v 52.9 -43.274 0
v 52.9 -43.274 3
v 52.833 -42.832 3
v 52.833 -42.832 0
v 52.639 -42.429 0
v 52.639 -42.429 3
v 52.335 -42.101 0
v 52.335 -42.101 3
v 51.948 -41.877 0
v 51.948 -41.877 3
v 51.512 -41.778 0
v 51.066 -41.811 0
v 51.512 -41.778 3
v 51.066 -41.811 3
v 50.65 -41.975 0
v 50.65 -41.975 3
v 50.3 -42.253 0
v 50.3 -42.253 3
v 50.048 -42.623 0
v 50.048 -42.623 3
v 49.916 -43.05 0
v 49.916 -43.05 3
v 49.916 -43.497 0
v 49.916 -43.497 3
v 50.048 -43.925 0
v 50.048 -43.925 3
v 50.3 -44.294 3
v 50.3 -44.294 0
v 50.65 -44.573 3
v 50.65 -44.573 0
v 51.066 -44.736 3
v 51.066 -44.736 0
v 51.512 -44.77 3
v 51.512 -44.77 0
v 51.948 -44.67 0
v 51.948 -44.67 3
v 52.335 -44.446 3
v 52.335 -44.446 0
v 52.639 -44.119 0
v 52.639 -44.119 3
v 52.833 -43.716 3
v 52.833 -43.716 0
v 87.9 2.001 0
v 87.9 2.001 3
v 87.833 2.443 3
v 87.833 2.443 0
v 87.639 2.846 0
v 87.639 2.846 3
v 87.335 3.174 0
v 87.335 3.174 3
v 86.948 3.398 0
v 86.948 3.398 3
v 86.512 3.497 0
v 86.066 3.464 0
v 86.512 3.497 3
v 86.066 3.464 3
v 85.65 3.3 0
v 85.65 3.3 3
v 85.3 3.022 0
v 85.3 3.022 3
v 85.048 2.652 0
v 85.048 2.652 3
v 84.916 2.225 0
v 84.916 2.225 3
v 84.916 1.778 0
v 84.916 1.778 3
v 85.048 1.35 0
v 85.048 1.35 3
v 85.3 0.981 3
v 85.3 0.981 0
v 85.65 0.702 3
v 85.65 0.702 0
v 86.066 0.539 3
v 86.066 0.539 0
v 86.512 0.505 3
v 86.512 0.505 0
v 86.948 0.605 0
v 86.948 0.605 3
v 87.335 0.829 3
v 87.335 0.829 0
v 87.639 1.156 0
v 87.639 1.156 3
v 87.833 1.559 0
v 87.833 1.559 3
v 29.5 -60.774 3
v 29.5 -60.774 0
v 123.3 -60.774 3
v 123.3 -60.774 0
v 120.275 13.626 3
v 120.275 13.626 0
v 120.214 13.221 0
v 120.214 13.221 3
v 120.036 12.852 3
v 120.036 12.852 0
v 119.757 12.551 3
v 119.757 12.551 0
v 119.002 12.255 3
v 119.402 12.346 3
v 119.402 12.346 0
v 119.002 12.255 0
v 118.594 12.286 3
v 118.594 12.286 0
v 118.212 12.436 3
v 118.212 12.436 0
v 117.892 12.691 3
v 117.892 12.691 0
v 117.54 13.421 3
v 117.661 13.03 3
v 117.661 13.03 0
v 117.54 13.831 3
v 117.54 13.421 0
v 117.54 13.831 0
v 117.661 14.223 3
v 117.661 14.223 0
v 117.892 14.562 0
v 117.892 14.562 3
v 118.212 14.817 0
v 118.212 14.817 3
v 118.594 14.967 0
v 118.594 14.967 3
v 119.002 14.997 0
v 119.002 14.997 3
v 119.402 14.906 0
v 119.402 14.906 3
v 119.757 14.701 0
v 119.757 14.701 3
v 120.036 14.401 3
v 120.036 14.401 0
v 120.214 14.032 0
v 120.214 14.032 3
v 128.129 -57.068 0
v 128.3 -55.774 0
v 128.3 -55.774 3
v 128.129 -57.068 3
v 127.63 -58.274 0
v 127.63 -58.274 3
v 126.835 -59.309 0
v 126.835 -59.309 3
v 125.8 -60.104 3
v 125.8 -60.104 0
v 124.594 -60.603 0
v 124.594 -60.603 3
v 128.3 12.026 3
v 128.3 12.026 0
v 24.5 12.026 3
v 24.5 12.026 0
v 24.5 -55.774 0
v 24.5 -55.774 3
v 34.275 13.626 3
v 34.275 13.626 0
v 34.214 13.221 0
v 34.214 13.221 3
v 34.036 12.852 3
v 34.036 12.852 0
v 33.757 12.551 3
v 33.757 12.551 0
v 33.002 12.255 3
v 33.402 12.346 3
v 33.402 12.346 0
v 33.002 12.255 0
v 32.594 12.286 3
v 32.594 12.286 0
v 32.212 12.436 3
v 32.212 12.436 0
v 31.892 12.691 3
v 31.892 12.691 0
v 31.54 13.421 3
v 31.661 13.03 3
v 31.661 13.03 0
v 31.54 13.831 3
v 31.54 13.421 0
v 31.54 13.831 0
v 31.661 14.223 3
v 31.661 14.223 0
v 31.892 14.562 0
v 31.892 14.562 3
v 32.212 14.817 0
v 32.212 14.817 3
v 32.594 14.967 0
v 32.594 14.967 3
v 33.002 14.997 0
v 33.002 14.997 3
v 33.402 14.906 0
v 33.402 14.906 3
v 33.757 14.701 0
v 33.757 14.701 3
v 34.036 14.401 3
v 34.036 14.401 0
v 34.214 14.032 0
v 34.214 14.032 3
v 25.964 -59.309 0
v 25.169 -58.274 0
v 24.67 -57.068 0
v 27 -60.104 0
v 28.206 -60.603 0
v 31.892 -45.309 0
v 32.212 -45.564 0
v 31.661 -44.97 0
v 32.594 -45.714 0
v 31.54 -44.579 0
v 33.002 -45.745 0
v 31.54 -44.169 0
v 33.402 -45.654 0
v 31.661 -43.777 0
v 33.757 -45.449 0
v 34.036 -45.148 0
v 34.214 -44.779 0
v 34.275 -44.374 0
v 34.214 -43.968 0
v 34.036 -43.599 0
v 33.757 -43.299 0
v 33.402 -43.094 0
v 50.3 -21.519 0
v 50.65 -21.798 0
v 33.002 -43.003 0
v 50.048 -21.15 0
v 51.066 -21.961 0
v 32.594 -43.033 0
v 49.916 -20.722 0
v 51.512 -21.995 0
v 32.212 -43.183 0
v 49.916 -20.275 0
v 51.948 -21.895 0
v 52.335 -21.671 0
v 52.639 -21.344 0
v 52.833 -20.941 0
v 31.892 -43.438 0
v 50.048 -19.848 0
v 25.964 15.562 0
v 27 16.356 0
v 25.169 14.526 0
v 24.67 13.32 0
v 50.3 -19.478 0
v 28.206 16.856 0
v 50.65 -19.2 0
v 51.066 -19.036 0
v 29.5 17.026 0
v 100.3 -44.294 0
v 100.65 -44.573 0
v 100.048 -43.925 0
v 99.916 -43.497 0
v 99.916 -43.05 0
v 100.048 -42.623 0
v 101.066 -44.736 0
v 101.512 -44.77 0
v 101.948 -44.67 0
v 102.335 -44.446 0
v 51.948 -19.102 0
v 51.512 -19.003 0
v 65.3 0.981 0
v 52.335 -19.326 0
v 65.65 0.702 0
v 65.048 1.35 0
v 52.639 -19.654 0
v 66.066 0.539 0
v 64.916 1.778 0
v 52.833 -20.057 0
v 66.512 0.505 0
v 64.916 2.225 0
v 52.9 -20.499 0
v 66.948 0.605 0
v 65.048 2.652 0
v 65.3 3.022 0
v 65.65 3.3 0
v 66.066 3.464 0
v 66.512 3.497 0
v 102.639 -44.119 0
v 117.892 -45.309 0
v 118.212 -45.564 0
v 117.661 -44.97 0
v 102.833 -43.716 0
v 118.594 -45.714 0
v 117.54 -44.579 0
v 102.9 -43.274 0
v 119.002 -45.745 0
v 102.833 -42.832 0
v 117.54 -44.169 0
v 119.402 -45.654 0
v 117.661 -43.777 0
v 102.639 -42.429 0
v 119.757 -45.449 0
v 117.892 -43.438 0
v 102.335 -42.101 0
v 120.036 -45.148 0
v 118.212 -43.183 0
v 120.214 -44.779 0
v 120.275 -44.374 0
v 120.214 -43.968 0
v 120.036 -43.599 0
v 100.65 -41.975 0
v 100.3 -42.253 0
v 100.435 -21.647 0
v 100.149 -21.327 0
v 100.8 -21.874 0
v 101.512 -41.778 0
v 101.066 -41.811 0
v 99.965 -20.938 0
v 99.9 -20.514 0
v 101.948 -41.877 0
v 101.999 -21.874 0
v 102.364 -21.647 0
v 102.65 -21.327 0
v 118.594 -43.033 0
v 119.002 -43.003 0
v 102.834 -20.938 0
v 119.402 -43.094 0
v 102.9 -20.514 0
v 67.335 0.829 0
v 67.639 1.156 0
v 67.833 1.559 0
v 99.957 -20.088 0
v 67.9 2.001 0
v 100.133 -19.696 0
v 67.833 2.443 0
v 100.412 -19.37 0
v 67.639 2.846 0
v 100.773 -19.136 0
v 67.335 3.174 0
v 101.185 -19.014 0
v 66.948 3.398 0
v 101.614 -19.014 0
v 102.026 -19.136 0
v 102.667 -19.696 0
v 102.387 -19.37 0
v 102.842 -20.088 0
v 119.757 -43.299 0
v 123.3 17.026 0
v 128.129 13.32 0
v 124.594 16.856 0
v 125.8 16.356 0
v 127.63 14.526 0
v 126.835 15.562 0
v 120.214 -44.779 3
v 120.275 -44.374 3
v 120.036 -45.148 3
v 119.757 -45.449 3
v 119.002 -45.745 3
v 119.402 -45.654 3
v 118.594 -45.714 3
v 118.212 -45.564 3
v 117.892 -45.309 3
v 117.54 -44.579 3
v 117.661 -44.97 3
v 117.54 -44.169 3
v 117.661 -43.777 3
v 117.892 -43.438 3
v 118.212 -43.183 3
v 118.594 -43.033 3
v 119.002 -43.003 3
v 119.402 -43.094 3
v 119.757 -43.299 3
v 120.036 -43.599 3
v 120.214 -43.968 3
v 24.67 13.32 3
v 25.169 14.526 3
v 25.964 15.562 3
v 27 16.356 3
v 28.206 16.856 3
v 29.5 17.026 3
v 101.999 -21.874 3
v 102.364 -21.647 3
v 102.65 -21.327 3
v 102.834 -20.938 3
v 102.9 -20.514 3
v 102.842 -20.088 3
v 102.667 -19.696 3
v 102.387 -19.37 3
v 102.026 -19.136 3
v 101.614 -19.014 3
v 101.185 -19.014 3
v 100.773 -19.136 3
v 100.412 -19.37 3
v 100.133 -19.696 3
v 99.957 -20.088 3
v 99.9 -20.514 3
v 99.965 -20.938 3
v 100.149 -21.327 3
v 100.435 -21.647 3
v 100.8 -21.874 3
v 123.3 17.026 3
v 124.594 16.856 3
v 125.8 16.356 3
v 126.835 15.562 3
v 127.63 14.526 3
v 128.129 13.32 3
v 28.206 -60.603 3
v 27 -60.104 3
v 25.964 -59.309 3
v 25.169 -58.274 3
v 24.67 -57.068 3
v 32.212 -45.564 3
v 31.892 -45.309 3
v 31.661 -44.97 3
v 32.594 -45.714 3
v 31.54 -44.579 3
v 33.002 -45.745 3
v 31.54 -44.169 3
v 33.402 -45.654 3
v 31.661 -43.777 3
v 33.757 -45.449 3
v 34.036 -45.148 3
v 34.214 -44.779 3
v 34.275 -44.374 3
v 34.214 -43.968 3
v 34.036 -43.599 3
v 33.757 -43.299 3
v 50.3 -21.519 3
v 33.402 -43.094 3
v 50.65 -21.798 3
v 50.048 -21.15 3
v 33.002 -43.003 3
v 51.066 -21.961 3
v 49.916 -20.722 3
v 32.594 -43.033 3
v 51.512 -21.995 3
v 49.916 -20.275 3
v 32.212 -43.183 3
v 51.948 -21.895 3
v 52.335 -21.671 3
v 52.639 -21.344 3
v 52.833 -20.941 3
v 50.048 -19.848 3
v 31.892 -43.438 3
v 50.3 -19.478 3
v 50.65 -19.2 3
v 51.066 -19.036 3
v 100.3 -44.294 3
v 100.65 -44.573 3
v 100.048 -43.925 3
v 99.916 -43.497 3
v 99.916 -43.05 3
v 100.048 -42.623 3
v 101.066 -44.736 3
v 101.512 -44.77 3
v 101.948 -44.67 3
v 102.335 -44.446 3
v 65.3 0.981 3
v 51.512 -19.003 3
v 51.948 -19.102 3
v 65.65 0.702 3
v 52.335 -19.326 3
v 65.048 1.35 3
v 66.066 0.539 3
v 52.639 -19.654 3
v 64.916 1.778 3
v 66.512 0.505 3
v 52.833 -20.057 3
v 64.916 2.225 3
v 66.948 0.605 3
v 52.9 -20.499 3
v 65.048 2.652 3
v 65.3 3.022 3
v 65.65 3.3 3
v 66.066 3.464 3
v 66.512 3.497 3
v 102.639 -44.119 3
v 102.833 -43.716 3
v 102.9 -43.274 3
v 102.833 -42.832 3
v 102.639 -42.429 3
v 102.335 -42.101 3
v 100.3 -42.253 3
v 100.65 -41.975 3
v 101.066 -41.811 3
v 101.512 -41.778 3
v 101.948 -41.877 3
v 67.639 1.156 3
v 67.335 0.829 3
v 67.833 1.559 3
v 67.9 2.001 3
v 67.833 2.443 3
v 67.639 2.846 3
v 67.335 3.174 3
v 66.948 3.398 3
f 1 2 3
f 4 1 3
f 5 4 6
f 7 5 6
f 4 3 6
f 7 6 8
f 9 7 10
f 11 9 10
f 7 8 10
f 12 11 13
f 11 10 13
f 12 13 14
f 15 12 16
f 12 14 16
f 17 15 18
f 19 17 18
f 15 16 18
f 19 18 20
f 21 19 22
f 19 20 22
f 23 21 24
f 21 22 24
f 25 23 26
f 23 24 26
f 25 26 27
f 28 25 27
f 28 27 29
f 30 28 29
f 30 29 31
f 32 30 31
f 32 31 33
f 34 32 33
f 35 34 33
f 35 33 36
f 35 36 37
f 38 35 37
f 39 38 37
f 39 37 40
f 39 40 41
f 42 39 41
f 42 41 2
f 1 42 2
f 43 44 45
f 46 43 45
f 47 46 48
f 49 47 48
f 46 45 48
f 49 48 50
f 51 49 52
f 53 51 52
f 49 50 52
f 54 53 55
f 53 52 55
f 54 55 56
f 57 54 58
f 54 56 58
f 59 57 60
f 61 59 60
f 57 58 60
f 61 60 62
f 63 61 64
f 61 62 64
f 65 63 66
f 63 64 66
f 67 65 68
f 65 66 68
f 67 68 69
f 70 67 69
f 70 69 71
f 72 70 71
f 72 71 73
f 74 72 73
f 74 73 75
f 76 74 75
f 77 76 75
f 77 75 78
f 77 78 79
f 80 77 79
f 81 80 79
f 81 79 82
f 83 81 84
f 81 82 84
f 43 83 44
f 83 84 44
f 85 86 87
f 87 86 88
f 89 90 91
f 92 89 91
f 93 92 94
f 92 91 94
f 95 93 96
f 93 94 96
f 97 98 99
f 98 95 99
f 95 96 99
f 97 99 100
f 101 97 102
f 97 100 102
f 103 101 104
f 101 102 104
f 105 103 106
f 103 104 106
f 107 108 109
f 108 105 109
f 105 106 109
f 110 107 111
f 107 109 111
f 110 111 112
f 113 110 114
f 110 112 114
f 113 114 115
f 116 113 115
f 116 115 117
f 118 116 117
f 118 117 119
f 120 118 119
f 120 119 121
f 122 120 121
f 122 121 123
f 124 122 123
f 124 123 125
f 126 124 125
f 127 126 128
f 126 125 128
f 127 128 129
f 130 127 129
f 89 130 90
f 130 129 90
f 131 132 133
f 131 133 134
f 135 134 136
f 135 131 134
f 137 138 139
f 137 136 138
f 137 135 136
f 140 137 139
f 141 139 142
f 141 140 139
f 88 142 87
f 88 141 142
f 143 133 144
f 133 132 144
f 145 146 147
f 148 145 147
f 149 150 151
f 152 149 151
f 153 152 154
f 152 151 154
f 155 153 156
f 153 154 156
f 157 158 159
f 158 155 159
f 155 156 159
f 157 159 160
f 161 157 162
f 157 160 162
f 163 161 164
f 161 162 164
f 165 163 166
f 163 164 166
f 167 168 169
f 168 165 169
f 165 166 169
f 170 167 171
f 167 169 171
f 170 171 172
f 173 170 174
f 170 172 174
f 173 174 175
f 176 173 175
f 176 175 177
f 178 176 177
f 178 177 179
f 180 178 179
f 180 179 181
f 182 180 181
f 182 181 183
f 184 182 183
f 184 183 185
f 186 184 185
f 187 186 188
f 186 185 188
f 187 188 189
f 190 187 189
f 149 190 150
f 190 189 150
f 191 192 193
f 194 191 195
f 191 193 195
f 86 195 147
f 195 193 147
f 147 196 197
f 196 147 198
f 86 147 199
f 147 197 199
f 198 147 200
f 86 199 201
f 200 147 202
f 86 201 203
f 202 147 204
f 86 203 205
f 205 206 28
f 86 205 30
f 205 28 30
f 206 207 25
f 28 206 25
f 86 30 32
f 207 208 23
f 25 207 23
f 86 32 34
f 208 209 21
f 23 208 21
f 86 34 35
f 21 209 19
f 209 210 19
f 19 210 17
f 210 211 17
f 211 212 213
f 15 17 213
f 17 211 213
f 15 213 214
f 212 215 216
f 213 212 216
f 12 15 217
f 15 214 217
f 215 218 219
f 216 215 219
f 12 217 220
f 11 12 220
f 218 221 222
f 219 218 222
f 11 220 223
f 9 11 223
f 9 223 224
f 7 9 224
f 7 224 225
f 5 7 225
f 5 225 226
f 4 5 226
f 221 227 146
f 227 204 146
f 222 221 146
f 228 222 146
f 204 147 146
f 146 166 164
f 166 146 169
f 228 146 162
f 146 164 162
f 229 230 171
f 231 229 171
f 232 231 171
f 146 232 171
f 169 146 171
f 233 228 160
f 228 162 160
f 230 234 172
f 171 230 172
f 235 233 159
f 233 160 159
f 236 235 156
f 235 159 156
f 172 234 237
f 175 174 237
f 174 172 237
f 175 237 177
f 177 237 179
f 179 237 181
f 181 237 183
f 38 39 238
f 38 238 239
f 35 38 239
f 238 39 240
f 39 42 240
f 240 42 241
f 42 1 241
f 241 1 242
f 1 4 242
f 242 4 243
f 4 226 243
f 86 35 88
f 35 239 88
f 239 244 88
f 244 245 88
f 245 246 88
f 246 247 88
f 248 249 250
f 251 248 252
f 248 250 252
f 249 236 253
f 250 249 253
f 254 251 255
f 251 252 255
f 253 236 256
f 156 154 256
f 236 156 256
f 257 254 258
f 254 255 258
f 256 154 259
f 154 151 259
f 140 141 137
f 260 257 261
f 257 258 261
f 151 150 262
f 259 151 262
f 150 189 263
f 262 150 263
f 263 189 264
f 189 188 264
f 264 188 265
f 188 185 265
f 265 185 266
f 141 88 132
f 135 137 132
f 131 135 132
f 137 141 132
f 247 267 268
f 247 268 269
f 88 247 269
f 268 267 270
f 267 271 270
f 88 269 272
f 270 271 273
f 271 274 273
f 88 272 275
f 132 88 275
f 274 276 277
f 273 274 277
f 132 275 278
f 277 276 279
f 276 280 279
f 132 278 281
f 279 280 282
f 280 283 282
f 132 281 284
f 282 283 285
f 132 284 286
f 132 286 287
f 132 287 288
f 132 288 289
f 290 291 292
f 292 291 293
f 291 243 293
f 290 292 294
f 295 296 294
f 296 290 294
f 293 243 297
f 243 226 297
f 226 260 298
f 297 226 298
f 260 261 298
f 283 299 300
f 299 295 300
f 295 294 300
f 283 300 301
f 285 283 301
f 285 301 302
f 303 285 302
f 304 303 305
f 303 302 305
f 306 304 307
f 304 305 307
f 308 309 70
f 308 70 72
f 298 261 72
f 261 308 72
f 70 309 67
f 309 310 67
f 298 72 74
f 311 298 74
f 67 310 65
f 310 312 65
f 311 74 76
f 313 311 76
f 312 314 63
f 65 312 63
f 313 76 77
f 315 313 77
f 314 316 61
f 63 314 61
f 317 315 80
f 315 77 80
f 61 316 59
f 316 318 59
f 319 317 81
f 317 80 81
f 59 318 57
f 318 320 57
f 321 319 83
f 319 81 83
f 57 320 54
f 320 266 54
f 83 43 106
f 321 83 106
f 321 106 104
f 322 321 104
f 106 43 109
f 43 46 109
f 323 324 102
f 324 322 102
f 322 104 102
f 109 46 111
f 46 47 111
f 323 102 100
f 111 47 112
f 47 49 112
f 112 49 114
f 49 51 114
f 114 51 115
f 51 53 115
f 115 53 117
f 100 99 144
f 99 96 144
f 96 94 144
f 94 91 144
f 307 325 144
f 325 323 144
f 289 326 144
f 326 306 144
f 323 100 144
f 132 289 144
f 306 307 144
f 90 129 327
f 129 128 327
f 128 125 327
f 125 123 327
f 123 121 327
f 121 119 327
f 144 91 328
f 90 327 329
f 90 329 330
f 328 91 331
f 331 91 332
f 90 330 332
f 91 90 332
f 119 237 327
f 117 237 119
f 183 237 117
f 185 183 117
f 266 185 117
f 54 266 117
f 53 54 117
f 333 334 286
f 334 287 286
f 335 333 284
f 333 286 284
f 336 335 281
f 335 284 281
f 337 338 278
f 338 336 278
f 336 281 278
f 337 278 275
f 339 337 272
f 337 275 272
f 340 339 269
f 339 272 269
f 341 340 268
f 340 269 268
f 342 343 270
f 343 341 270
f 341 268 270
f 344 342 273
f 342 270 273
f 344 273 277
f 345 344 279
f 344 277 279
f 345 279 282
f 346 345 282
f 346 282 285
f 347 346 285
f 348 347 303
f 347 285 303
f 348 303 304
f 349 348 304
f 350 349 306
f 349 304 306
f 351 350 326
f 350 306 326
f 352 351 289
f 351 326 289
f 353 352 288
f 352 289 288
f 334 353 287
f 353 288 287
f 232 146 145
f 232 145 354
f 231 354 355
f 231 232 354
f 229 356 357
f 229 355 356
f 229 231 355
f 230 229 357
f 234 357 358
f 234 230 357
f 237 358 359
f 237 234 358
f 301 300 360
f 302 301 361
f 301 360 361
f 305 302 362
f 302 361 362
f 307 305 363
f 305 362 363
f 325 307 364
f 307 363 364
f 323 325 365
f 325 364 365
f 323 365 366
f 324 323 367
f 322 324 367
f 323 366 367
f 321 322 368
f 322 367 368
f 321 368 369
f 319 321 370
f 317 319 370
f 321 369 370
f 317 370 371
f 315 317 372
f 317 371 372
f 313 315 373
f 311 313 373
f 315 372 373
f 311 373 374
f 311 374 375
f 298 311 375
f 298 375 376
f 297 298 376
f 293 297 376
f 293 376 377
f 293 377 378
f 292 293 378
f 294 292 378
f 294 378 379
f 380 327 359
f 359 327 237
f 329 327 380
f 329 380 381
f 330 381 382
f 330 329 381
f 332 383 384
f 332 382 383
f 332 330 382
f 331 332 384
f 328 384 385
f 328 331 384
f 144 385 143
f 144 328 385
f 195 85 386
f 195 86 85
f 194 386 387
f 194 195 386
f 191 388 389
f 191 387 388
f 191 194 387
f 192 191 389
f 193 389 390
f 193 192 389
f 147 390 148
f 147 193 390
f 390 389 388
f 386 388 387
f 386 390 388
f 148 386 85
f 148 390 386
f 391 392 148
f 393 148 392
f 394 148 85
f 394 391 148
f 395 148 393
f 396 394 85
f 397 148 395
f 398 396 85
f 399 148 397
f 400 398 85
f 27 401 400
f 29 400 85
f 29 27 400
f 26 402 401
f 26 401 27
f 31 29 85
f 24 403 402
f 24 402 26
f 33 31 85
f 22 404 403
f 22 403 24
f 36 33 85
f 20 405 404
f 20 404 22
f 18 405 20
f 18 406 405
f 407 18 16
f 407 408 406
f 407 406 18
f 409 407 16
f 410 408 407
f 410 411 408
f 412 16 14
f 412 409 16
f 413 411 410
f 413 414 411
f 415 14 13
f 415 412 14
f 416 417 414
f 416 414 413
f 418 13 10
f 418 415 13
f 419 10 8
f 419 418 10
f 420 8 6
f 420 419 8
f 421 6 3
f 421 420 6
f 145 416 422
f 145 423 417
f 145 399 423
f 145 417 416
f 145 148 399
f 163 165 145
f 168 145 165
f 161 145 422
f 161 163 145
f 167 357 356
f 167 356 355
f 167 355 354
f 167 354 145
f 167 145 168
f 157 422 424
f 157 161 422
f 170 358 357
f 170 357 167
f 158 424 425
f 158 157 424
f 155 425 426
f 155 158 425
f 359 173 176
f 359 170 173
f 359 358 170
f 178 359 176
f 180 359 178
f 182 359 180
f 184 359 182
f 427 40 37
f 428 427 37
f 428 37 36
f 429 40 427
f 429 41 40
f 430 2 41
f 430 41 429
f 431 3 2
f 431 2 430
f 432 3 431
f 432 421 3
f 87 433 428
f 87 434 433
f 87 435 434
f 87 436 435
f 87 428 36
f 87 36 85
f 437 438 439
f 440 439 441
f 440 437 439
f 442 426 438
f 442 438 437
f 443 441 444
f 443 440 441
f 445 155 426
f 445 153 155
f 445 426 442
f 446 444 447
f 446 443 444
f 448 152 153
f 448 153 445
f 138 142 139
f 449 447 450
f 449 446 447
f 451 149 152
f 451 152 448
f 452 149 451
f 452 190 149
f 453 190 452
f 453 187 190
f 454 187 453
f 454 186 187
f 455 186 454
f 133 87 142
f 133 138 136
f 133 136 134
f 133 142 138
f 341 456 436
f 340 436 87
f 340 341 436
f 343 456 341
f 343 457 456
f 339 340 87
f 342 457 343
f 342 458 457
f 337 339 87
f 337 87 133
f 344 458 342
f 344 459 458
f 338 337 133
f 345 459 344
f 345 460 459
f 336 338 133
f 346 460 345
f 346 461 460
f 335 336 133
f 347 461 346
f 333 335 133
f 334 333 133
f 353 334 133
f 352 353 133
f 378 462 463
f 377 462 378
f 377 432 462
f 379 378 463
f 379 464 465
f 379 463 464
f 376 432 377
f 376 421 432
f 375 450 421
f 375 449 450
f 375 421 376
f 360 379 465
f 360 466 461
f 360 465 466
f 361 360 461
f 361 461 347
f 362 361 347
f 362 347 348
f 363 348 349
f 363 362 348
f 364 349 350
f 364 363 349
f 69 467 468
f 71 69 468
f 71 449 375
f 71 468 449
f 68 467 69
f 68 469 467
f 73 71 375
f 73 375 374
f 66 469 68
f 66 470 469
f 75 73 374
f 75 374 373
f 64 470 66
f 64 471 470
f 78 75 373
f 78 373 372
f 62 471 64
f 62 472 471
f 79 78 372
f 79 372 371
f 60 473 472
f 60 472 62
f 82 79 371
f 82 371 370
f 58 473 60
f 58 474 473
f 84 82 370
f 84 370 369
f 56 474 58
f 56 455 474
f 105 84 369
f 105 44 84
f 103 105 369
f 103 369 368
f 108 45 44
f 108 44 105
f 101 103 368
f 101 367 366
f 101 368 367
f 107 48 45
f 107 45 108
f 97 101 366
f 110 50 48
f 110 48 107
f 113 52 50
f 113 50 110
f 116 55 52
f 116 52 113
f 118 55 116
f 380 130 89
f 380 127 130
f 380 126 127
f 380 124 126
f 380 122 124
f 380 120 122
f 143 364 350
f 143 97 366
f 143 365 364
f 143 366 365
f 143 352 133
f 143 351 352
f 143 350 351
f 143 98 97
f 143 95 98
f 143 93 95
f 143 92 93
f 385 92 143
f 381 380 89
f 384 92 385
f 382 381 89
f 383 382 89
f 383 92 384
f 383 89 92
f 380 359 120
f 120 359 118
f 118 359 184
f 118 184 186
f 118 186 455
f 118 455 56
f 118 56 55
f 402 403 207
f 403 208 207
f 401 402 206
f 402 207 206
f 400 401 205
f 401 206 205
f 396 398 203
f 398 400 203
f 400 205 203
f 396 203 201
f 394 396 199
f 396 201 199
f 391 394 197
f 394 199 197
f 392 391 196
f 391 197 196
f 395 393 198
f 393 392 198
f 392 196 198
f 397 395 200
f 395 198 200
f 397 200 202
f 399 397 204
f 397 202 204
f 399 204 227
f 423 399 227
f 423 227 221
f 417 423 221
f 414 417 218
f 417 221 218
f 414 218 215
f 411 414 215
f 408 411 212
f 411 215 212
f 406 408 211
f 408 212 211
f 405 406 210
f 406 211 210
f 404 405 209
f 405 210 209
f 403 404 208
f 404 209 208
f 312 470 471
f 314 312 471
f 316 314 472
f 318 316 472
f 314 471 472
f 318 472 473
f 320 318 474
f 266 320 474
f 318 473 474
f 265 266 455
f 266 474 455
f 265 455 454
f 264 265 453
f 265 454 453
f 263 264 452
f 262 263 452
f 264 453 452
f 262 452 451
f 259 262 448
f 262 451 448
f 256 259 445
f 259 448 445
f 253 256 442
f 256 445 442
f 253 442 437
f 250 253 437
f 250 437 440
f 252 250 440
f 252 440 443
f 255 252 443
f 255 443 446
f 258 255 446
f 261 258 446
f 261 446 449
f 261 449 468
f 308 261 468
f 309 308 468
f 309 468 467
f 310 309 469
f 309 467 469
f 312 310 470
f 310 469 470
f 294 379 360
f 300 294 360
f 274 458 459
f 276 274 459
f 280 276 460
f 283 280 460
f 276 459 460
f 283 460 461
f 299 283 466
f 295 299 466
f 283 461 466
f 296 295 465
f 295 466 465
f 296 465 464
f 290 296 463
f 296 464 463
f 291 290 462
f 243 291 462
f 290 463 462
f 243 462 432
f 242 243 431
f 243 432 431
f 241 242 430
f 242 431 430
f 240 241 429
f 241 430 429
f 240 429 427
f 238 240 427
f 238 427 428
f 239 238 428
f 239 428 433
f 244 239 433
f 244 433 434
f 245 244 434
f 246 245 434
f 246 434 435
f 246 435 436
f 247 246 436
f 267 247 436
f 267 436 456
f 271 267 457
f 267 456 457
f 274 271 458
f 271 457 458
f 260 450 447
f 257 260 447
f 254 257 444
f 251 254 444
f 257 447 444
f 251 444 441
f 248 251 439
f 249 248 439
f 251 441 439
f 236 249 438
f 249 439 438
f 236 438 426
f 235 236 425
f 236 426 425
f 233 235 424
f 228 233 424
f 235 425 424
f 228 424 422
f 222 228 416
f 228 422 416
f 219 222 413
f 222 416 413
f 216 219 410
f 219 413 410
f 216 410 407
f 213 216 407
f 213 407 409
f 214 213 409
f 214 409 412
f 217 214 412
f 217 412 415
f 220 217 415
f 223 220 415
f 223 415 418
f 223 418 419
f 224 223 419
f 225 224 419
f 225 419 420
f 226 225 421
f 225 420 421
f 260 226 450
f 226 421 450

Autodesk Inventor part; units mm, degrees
ref_plane "YZ Plane" through (0, 0, 0) normal (1, 0, 0) x (0, 1, 0)
ref_plane "XZ Plane" through (0, 0, 0) normal (0, 1, 0) x (-1, 0, 0)
ref_plane "XY Plane" through (0, 0, 0) normal (0, 0, 1) x (1, 0, 0)
sketch "Эскиз1" plane through (0, 0, 0) normal (0, 0, 1) x (1, 0, 0)
  circle A0 centre (41.8996, -50.8737) radius 1.5 projected
  circle A1 centre (115.8996, -50.8737) radius 1.5 projected
  line L0 (128.2996, -55.7737) -> (128.2996, 12.0263) projected
  arc A2 (128.2996, 12.0263) -> (123.2996, 17.0263) centre (123.2996, 12.0263) ccw projected
  line L1 (123.2996, 17.0263) -> (29.4996, 17.0263) projected
  arc A3 (29.4996, 17.0263) -> (24.4996, 12.0263) centre (29.4996, 12.0263) ccw projected
  line L2 (24.4996, 12.0263) -> (24.4996, -55.7737) projected
  arc A4 (24.4996, -55.7737) -> (29.4996, -60.7737) centre (29.4996, -55.7737) ccw projected
  line L3 (29.4996, -60.7737) -> (123.2996, -60.7737) projected
  arc A5 (123.2996, -60.7737) -> (128.2996, -55.7737) centre (123.2996, -55.7737) ccw projected
  line L4 (53.8996, 12.1263) -> (105.3355, 12.1263) projected
  arc A6 (105.3355, 9.1263) -> (105.3355, 12.1263) centre (105.3355, 10.6263) ccw projected
  line L5 (105.3355, 9.1263) -> (53.8996, 9.1263) projected
  arc A7 (53.8996, 12.1263) -> (53.8996, 9.1263) centre (53.8996, 10.6263) ccw projected
  circle A8 centre (53.8996, -6.8737) radius 1.5 projected
  circle A9 centre (53.8996, -36.8737) radius 1.5 projected
  circle A10 centre (103.8996, -36.8737) radius 1.5 projected
  circle A11 centre (103.8996, -6.8737) radius 1.5 projected
  circle A12 centre (118.8996, -44.3737) radius 1.375 projected
  circle A13 centre (32.8996, -44.3737) radius 1.375 projected
  circle A14 centre (32.8996, 13.6263) radius 1.375 projected
  circle A15 centre (118.8996, 13.6263) radius 1.375 projected
  line L6 (105.3355, -0.8737) -> (53.8996, -0.8737) projected
  arc A16 (53.8996, 2.1263) -> (53.8996, -0.8737) centre (53.8996, 0.6263) ccw projected
  line L7 (53.8996, 2.1263) -> (105.3355, 2.1263) projected
  arc A17 (105.3355, -0.8737) -> (105.3355, 2.1263) centre (105.3355, 0.6263) ccw projected
  arc A18 (53.8996, -42.8737) -> (53.8996, -45.8737) centre (53.8996, -44.3737) ccw projected
  line L8 (53.8996, -42.8737) -> (103.8996, -42.8737) projected
  arc A19 (103.8996, -45.8737) -> (103.8996, -42.8737) centre (103.8996, -44.3737) ccw projected
  line L9 (103.8996, -45.8737) -> (53.8996, -45.8737) projected
  line L10 (103.8996, -55.8737) -> (53.8996, -55.8737) projected
  arc A20 (53.8996, -52.8737) -> (53.8996, -55.8737) centre (53.8996, -54.3737) ccw projected
  line L11 (53.8996, -52.8737) -> (103.8996, -52.8737) projected
  arc A21 (103.8996, -55.8737) -> (103.8996, -52.8737) centre (103.8996, -54.3737) ccw projected
  line L12 (76.7782, -31.8737) -> (72.5356, -27.6311) projected
  arc A22 (74.6569, -25.5097) -> (72.5356, -27.6311) centre (73.5963, -26.5704) ccw projected
  line L13 (74.6569, -25.5097) -> (77.3996, -28.2524) projected
  line L14 (77.3996, -28.2524) -> (77.3996, -11.8737) projected
  arc A23 (80.3996, -11.8737) -> (77.3996, -11.8737) centre (78.8996, -11.8737) ccw projected
  line L15 (80.3996, -11.8737) -> (80.3996, -28.2524) projected
  line L16 (80.3996, -28.2524) -> (83.1422, -25.5097) projected
  arc A24 (85.2635, -27.6311) -> (83.1422, -25.5097) centre (84.2029, -26.5704) ccw projected
  line L17 (85.2635, -27.6311) -> (81.0209, -31.8737) projected
  arc A25 (76.7782, -31.8737) -> (81.0209, -31.8737) centre (78.8996, -31.8737) ccw projected
  point P0 (0, 0)
extrude "Выдавливание1" add sketch "Эскиз1" along normal blind 3 contours A0 | A1 | A5 L3 A4 L2 A3 L1 A2 L0 | L4 A6 L5 A7 | A8 | A9 | A10 | A11 | L6 A16 L7 A17 | L8 A19 L9 A18 | L10 A20 L11 A21 | L12 A22 L13 L14 A23 L15 L16 A24 L17 A25
sketch "Эскиз2" plane through (0, 0, 3) normal (0, 0, 1) x (1, 0, 0)
  line L0 (29.4996, -60.7737) -> (123.2996, -60.7737) projected
  circle A0 centre (51.3996, -43.2737) radius 1.5
  circle A1 centre (101.3996, -43.2737) radius 1.5
  point P0 (0, 0)
  dimension "d6" = 3
  dimension "d7" = 3
extrude "Выдавливание2" cut sketch "Эскиз2" against normal blind 3
sketch "Эскиз3" plane through (0, 0, 3) normal (0, 0, 1) x (1, 0, 0)
  line L0 (24.4996, 12.0263) -> (24.4996, -55.7737) projected
  line L1 (24.4996, -21.8737) -> (128.2996, -21.8737)
  line L2 (128.2996, -55.7737) -> (128.2996, 12.0263) projected
  line L3 (76.3996, -21.8737) -> (76.3996, 17.0263)
  line L4 (123.2996, 17.0263) -> (29.4996, 17.0263) projected
  circle A0 centre (118.8996, -44.3737) radius 1.375 projected
  circle A1 centre (101.3996, -43.2737) radius 1.5 projected
  circle A2 centre (51.3996, -20.4987) radius 1.5
  circle A3 centre (101.3996, -20.4987) radius 1.5
  line L5 (76.3996, -20.4987) -> (76.3996, -7.9987)
  line L6 (76.3996, -7.9987) -> (76.3996, 2.0013)
  circle A4 centre (66.3996, 2.0013) radius 1.5
  circle A5 centre (86.3996, 2.0013) radius 1.5
  point P0 (0, 0)
  point P1 (101.999, -21.8737)
  point P2 (100.8001, -21.8737)
  dimension "d13" = 3
  dimension "d14" = 3
  dimension "d19" = 3
  dimension "d20" = 3
extrude "Выдавливание3" cut sketch "Эскиз3" against normal blind 3 contours A2 L1 | A3 L1 | L1 A2 | A4 | A5 picked at (100.9144, -20.3462)
properties part number "down_plate"
